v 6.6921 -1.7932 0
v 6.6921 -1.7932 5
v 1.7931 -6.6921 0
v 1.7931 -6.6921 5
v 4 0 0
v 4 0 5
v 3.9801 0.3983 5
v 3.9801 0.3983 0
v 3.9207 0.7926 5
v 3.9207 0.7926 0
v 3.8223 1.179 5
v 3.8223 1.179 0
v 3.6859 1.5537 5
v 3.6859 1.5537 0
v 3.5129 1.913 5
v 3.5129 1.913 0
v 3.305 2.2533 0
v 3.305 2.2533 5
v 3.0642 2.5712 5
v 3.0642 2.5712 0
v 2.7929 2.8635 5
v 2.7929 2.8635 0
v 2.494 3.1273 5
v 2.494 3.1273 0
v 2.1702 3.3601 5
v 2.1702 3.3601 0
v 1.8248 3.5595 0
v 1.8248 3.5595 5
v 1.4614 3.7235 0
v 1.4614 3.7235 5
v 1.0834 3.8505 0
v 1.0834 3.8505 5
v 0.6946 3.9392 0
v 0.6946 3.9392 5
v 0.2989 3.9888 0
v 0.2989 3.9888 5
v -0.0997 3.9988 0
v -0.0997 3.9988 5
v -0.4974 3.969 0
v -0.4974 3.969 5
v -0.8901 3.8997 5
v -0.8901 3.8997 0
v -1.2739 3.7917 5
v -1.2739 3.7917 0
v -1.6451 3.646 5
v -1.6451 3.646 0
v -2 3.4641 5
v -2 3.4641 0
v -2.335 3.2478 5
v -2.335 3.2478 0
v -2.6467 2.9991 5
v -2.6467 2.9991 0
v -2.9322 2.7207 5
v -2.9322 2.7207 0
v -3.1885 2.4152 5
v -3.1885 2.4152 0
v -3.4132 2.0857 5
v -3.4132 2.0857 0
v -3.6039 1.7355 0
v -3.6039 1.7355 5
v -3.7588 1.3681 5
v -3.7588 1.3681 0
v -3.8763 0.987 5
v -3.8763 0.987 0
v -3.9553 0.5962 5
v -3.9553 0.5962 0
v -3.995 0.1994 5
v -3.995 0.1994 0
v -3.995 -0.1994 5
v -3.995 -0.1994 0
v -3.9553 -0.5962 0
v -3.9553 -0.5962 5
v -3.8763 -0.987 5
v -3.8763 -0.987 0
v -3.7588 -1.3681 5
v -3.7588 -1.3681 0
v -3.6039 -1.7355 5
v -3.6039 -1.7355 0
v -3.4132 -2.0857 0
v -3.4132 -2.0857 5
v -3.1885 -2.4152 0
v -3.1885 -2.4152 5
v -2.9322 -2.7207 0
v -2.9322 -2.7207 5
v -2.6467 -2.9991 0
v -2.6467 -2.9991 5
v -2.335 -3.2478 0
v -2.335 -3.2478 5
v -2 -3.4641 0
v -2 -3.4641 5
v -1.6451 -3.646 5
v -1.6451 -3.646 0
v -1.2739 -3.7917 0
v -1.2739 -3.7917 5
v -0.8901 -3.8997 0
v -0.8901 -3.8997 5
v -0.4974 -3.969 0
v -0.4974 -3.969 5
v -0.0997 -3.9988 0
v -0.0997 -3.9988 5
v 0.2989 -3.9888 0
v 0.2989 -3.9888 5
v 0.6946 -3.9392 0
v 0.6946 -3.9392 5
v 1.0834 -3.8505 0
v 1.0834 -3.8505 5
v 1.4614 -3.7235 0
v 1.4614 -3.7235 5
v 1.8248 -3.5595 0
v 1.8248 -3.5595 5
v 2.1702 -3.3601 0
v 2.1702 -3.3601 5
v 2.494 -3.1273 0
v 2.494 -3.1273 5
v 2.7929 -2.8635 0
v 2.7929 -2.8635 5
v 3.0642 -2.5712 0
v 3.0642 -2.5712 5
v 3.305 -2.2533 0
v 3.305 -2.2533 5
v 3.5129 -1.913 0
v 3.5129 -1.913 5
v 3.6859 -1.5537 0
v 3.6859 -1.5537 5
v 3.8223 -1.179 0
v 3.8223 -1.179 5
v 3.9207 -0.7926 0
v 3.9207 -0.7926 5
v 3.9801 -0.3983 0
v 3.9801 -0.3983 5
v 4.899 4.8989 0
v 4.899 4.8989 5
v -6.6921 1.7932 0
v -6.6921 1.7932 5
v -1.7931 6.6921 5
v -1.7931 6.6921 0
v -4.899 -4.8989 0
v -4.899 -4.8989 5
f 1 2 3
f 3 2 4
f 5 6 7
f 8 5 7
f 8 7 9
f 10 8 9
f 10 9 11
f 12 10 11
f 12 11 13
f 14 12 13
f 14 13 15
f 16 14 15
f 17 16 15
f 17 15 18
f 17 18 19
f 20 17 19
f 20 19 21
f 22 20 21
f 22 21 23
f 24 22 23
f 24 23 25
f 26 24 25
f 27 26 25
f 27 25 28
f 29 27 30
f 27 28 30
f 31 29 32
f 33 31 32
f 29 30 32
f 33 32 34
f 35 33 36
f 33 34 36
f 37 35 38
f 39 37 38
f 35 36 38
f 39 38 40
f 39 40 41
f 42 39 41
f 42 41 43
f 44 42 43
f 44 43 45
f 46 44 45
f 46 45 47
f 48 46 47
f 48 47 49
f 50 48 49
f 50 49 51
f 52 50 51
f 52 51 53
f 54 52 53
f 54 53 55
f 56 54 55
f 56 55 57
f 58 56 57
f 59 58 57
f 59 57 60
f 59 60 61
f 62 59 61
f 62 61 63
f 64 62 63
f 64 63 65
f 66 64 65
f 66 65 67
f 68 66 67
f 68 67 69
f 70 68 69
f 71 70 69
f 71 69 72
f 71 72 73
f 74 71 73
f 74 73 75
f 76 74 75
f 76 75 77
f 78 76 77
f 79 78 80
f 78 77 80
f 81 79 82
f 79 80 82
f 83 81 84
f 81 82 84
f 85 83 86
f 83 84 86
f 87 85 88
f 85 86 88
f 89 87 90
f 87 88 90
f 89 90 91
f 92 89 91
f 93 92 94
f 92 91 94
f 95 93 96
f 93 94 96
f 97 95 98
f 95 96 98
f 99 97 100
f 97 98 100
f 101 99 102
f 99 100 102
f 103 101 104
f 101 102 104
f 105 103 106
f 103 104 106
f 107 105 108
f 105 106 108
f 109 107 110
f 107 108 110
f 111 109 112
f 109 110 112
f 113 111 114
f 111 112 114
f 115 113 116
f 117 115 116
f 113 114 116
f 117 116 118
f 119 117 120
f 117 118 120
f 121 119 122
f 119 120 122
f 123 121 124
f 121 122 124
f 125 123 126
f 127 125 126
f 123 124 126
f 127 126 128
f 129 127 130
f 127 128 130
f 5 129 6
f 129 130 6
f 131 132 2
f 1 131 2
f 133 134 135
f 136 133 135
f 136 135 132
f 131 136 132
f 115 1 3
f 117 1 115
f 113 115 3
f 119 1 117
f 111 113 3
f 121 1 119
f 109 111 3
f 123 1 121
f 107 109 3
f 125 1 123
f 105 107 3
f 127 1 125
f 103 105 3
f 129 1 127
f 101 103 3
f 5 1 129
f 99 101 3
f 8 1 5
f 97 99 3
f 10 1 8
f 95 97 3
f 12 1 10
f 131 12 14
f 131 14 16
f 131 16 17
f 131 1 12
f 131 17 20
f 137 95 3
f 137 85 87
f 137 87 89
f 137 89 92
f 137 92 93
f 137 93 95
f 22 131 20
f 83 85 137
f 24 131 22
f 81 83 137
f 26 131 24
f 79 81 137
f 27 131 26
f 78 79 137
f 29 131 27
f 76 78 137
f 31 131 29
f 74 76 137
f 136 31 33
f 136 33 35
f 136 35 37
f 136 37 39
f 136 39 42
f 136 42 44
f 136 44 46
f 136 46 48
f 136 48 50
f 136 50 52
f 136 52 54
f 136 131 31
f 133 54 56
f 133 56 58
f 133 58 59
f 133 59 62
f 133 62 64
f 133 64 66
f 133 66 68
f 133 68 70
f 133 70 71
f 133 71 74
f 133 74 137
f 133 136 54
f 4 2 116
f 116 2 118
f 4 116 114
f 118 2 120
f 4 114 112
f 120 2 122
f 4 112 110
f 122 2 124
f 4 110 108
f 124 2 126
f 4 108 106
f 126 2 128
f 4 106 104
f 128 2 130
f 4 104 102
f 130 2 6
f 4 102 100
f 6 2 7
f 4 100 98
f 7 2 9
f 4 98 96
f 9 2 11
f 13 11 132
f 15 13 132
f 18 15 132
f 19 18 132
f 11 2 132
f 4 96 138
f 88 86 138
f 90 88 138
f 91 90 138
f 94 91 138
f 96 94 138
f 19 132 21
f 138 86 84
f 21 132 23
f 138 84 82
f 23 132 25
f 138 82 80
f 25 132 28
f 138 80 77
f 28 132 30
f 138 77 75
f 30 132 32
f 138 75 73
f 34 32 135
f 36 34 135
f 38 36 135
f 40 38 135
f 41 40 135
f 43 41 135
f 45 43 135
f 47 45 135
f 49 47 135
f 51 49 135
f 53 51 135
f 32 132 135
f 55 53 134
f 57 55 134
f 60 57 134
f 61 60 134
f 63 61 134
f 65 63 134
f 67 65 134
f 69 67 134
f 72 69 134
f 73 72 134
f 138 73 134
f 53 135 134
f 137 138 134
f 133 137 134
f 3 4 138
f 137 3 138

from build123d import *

# Parameters (mm, degrees)
CROQUIS1_R              = 6
CROQUIS1_R_2            = 2.5
SALIENTE_EXTRUIR1_DEPTH = 5
CROQUIS2_R              = 4
SALIENTE_EXTRUIR2_DEPTH = 5
CROQUIS3_R              = 4
CORTAR_EXTRUIR1_DEPTH   = 10


with BuildPart() as part:
    # Croquis1 → Saliente-Extruir1 (new body)
    with BuildSketch(Plane.XY):
        Circle(CROQUIS1_R)
        Circle(CROQUIS1_R_2, mode=Mode.SUBTRACT)
    extrude(amount=SALIENTE_EXTRUIR1_DEPTH)

    # Croquis2 → Saliente-Extruir2 (add)
    with BuildSketch(Plane.XY.offset(5)):
        Polygon((-6.692111353, 1.79322214), (-1.793079748, 6.692149506), (4.899031604, 4.898927366), (6.692111353, -1.79322214), (1.793079748, -6.692149506), (-4.899031604, -4.898927366), align=None)
        Circle(CROQUIS2_R, mode=Mode.SUBTRACT)
    extrude(amount=-SALIENTE_EXTRUIR2_DEPTH)

    # Croquis3 → Cortar-Extruir1 (cut)
    with BuildSketch(Plane.XY.offset(5)):
        Circle(CROQUIS3_R)
    extrude(amount=-CORTAR_EXTRUIR1_DEPTH, mode=Mode.SUBTRACT)


solid = part.part
